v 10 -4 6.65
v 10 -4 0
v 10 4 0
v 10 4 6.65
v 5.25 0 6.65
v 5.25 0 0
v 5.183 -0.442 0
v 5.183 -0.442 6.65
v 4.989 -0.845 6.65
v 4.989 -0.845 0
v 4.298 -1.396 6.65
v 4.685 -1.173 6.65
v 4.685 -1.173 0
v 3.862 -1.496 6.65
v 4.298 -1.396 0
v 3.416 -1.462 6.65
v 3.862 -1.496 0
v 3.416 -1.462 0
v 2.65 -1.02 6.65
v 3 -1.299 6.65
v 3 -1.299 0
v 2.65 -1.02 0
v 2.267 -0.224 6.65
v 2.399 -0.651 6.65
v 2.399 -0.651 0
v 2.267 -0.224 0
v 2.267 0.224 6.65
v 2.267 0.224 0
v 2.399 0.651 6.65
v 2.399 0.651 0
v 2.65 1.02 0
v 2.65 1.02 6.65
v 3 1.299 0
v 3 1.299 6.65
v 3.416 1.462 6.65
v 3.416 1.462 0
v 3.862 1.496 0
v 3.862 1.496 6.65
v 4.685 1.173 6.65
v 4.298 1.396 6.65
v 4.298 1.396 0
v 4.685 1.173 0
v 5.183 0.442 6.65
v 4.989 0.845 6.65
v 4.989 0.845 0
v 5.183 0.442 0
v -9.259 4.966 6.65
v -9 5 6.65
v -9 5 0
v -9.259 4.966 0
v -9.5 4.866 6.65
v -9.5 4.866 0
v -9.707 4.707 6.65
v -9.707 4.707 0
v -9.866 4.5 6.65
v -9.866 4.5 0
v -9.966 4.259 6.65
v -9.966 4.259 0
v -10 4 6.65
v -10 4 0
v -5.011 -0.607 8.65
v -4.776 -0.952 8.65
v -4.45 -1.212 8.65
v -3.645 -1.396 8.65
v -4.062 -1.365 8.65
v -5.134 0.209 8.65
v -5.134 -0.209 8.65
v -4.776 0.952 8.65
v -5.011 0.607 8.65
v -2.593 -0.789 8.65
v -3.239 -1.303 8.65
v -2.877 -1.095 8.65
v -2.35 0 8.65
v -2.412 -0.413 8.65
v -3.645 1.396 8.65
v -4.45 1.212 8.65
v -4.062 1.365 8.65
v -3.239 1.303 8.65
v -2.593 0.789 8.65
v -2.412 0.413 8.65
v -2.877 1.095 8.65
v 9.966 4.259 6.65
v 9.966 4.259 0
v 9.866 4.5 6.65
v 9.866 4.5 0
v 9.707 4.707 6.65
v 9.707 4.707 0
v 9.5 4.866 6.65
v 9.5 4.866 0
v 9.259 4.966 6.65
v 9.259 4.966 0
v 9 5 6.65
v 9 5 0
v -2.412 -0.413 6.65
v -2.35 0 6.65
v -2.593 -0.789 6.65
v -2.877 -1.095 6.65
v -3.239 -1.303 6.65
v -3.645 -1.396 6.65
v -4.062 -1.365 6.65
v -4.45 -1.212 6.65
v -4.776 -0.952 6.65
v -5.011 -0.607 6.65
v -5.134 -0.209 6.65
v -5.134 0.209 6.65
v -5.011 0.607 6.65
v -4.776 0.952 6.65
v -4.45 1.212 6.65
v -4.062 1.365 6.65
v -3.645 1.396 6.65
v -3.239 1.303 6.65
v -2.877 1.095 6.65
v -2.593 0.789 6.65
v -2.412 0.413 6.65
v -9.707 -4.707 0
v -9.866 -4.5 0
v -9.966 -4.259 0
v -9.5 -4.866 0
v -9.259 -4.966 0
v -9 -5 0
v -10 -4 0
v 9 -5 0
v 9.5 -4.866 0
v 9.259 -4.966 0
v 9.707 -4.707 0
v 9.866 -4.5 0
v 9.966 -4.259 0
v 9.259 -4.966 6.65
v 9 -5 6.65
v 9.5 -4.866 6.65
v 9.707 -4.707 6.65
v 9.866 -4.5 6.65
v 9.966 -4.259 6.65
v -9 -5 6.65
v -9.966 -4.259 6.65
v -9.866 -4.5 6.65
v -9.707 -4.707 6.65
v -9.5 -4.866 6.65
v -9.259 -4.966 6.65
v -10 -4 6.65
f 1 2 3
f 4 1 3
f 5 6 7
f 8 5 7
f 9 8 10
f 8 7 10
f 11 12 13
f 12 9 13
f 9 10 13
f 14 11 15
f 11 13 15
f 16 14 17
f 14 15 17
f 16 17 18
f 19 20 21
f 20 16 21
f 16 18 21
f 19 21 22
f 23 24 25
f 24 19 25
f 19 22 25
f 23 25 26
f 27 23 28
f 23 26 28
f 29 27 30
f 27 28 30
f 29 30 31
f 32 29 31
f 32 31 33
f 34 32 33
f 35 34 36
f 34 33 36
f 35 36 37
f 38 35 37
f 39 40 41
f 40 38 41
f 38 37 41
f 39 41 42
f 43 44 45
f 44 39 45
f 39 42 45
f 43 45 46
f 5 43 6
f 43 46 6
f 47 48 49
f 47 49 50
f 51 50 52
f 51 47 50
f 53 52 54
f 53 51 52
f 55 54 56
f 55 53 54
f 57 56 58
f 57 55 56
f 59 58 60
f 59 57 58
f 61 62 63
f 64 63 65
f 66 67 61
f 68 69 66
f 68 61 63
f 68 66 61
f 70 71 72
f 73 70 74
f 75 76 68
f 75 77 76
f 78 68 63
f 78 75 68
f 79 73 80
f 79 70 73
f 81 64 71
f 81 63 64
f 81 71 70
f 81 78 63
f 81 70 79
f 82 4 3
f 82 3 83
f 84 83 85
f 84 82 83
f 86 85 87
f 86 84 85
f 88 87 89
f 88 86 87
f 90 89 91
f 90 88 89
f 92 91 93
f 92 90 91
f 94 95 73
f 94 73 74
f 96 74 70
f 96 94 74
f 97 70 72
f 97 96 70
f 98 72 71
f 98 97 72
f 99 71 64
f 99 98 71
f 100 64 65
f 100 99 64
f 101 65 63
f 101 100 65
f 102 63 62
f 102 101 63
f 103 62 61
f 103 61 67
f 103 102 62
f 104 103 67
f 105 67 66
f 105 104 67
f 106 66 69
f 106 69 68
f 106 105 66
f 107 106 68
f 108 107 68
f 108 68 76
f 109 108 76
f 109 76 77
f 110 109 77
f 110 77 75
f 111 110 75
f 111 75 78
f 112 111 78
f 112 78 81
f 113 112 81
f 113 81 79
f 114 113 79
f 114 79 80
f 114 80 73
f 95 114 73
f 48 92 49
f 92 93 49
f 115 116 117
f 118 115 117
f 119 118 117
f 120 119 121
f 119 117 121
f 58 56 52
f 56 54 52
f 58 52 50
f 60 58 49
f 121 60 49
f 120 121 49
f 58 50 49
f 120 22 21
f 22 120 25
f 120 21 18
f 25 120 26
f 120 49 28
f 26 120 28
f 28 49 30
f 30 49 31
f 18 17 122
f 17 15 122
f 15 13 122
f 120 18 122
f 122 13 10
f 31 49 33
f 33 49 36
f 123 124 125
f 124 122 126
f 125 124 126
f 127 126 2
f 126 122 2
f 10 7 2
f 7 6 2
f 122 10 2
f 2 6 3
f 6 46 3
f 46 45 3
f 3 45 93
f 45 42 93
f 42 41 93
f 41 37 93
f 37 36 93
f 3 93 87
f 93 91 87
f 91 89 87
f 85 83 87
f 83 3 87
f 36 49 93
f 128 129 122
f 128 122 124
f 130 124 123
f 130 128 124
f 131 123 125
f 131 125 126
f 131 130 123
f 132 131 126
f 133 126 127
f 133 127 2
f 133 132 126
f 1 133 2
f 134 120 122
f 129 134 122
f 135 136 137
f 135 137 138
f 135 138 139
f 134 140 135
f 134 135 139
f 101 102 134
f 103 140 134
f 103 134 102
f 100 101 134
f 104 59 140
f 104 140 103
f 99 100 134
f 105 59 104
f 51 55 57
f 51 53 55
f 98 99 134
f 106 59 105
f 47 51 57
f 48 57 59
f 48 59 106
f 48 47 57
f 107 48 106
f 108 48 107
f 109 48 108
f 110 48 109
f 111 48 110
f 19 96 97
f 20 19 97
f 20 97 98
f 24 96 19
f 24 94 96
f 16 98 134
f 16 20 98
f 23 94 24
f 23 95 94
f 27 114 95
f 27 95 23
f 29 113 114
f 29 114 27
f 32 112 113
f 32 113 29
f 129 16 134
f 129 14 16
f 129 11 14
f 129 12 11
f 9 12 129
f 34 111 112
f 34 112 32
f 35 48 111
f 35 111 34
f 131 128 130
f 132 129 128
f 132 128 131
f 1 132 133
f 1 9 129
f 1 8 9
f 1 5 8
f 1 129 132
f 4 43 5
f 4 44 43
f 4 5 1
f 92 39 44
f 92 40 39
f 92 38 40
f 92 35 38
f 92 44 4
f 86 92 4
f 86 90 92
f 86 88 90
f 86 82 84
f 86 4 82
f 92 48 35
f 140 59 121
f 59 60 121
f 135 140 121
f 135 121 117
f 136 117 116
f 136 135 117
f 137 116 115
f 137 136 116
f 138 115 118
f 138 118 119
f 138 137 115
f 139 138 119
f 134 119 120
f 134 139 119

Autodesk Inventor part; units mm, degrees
ref_plane "YZ Plane" through (0, 0, 0) normal (1, 0, 0) x (0, 1, 0)
ref_plane "XZ Plane" through (0, 0, 0) normal (0, 1, 0) x (-1, 0, 0)
ref_plane "XY Plane" through (0, 0, 0) normal (0, 0, 1) x (1, 0, 0)
sketch "Sketch1" plane through (0, 0, 0) normal (0, 0, 1) x (1, 0, 0)
  line L0 (-10, -5) -> (10, -5)
  line L1 (10, -5) -> (10, 5)
  line L2 (10, 5) -> (-10, 5)
  line L3 (-10, 5) -> (-10, -5)
  line L4 (-10, -5) -> (10, 5) construction
  line L5 (10, -5) -> (-10, 5) construction
  line L6 (-14, 0) -> (14, 0) construction
  circle A0 centre (3.75, 0) radius 1.5
  point P0 (0, 0)
  dimension "d0" = 20
  dimension "d1" = 10
  dimension "d2" = 3
  dimension "d3" = 3.75
extrude "Extrusion1" add sketch "Sketch1" along normal blind 6.65
sketch "Sketch2" plane through (0, 0, 6.65) normal (0, 0, 1) x (1, 0, 0)
  line L0 (-14, 0) -> (14, 0) projected
  circle A0 centre (-3.75, 0) radius 1.4
  point P0 (0, 0)
  dimension "d6" = 2.8
  dimension "d7" = 3.75
extrude "Extrusion2" add sketch "Sketch2" along normal blind 2
fillet "Fillet2" radius 1 4 edges at (10, -5, 3.325) (10, 5, 3.325) (-10, -5, 3.325) (-10, 5, 3.325)
properties part number "PWR_PCBA_HeatSink"
